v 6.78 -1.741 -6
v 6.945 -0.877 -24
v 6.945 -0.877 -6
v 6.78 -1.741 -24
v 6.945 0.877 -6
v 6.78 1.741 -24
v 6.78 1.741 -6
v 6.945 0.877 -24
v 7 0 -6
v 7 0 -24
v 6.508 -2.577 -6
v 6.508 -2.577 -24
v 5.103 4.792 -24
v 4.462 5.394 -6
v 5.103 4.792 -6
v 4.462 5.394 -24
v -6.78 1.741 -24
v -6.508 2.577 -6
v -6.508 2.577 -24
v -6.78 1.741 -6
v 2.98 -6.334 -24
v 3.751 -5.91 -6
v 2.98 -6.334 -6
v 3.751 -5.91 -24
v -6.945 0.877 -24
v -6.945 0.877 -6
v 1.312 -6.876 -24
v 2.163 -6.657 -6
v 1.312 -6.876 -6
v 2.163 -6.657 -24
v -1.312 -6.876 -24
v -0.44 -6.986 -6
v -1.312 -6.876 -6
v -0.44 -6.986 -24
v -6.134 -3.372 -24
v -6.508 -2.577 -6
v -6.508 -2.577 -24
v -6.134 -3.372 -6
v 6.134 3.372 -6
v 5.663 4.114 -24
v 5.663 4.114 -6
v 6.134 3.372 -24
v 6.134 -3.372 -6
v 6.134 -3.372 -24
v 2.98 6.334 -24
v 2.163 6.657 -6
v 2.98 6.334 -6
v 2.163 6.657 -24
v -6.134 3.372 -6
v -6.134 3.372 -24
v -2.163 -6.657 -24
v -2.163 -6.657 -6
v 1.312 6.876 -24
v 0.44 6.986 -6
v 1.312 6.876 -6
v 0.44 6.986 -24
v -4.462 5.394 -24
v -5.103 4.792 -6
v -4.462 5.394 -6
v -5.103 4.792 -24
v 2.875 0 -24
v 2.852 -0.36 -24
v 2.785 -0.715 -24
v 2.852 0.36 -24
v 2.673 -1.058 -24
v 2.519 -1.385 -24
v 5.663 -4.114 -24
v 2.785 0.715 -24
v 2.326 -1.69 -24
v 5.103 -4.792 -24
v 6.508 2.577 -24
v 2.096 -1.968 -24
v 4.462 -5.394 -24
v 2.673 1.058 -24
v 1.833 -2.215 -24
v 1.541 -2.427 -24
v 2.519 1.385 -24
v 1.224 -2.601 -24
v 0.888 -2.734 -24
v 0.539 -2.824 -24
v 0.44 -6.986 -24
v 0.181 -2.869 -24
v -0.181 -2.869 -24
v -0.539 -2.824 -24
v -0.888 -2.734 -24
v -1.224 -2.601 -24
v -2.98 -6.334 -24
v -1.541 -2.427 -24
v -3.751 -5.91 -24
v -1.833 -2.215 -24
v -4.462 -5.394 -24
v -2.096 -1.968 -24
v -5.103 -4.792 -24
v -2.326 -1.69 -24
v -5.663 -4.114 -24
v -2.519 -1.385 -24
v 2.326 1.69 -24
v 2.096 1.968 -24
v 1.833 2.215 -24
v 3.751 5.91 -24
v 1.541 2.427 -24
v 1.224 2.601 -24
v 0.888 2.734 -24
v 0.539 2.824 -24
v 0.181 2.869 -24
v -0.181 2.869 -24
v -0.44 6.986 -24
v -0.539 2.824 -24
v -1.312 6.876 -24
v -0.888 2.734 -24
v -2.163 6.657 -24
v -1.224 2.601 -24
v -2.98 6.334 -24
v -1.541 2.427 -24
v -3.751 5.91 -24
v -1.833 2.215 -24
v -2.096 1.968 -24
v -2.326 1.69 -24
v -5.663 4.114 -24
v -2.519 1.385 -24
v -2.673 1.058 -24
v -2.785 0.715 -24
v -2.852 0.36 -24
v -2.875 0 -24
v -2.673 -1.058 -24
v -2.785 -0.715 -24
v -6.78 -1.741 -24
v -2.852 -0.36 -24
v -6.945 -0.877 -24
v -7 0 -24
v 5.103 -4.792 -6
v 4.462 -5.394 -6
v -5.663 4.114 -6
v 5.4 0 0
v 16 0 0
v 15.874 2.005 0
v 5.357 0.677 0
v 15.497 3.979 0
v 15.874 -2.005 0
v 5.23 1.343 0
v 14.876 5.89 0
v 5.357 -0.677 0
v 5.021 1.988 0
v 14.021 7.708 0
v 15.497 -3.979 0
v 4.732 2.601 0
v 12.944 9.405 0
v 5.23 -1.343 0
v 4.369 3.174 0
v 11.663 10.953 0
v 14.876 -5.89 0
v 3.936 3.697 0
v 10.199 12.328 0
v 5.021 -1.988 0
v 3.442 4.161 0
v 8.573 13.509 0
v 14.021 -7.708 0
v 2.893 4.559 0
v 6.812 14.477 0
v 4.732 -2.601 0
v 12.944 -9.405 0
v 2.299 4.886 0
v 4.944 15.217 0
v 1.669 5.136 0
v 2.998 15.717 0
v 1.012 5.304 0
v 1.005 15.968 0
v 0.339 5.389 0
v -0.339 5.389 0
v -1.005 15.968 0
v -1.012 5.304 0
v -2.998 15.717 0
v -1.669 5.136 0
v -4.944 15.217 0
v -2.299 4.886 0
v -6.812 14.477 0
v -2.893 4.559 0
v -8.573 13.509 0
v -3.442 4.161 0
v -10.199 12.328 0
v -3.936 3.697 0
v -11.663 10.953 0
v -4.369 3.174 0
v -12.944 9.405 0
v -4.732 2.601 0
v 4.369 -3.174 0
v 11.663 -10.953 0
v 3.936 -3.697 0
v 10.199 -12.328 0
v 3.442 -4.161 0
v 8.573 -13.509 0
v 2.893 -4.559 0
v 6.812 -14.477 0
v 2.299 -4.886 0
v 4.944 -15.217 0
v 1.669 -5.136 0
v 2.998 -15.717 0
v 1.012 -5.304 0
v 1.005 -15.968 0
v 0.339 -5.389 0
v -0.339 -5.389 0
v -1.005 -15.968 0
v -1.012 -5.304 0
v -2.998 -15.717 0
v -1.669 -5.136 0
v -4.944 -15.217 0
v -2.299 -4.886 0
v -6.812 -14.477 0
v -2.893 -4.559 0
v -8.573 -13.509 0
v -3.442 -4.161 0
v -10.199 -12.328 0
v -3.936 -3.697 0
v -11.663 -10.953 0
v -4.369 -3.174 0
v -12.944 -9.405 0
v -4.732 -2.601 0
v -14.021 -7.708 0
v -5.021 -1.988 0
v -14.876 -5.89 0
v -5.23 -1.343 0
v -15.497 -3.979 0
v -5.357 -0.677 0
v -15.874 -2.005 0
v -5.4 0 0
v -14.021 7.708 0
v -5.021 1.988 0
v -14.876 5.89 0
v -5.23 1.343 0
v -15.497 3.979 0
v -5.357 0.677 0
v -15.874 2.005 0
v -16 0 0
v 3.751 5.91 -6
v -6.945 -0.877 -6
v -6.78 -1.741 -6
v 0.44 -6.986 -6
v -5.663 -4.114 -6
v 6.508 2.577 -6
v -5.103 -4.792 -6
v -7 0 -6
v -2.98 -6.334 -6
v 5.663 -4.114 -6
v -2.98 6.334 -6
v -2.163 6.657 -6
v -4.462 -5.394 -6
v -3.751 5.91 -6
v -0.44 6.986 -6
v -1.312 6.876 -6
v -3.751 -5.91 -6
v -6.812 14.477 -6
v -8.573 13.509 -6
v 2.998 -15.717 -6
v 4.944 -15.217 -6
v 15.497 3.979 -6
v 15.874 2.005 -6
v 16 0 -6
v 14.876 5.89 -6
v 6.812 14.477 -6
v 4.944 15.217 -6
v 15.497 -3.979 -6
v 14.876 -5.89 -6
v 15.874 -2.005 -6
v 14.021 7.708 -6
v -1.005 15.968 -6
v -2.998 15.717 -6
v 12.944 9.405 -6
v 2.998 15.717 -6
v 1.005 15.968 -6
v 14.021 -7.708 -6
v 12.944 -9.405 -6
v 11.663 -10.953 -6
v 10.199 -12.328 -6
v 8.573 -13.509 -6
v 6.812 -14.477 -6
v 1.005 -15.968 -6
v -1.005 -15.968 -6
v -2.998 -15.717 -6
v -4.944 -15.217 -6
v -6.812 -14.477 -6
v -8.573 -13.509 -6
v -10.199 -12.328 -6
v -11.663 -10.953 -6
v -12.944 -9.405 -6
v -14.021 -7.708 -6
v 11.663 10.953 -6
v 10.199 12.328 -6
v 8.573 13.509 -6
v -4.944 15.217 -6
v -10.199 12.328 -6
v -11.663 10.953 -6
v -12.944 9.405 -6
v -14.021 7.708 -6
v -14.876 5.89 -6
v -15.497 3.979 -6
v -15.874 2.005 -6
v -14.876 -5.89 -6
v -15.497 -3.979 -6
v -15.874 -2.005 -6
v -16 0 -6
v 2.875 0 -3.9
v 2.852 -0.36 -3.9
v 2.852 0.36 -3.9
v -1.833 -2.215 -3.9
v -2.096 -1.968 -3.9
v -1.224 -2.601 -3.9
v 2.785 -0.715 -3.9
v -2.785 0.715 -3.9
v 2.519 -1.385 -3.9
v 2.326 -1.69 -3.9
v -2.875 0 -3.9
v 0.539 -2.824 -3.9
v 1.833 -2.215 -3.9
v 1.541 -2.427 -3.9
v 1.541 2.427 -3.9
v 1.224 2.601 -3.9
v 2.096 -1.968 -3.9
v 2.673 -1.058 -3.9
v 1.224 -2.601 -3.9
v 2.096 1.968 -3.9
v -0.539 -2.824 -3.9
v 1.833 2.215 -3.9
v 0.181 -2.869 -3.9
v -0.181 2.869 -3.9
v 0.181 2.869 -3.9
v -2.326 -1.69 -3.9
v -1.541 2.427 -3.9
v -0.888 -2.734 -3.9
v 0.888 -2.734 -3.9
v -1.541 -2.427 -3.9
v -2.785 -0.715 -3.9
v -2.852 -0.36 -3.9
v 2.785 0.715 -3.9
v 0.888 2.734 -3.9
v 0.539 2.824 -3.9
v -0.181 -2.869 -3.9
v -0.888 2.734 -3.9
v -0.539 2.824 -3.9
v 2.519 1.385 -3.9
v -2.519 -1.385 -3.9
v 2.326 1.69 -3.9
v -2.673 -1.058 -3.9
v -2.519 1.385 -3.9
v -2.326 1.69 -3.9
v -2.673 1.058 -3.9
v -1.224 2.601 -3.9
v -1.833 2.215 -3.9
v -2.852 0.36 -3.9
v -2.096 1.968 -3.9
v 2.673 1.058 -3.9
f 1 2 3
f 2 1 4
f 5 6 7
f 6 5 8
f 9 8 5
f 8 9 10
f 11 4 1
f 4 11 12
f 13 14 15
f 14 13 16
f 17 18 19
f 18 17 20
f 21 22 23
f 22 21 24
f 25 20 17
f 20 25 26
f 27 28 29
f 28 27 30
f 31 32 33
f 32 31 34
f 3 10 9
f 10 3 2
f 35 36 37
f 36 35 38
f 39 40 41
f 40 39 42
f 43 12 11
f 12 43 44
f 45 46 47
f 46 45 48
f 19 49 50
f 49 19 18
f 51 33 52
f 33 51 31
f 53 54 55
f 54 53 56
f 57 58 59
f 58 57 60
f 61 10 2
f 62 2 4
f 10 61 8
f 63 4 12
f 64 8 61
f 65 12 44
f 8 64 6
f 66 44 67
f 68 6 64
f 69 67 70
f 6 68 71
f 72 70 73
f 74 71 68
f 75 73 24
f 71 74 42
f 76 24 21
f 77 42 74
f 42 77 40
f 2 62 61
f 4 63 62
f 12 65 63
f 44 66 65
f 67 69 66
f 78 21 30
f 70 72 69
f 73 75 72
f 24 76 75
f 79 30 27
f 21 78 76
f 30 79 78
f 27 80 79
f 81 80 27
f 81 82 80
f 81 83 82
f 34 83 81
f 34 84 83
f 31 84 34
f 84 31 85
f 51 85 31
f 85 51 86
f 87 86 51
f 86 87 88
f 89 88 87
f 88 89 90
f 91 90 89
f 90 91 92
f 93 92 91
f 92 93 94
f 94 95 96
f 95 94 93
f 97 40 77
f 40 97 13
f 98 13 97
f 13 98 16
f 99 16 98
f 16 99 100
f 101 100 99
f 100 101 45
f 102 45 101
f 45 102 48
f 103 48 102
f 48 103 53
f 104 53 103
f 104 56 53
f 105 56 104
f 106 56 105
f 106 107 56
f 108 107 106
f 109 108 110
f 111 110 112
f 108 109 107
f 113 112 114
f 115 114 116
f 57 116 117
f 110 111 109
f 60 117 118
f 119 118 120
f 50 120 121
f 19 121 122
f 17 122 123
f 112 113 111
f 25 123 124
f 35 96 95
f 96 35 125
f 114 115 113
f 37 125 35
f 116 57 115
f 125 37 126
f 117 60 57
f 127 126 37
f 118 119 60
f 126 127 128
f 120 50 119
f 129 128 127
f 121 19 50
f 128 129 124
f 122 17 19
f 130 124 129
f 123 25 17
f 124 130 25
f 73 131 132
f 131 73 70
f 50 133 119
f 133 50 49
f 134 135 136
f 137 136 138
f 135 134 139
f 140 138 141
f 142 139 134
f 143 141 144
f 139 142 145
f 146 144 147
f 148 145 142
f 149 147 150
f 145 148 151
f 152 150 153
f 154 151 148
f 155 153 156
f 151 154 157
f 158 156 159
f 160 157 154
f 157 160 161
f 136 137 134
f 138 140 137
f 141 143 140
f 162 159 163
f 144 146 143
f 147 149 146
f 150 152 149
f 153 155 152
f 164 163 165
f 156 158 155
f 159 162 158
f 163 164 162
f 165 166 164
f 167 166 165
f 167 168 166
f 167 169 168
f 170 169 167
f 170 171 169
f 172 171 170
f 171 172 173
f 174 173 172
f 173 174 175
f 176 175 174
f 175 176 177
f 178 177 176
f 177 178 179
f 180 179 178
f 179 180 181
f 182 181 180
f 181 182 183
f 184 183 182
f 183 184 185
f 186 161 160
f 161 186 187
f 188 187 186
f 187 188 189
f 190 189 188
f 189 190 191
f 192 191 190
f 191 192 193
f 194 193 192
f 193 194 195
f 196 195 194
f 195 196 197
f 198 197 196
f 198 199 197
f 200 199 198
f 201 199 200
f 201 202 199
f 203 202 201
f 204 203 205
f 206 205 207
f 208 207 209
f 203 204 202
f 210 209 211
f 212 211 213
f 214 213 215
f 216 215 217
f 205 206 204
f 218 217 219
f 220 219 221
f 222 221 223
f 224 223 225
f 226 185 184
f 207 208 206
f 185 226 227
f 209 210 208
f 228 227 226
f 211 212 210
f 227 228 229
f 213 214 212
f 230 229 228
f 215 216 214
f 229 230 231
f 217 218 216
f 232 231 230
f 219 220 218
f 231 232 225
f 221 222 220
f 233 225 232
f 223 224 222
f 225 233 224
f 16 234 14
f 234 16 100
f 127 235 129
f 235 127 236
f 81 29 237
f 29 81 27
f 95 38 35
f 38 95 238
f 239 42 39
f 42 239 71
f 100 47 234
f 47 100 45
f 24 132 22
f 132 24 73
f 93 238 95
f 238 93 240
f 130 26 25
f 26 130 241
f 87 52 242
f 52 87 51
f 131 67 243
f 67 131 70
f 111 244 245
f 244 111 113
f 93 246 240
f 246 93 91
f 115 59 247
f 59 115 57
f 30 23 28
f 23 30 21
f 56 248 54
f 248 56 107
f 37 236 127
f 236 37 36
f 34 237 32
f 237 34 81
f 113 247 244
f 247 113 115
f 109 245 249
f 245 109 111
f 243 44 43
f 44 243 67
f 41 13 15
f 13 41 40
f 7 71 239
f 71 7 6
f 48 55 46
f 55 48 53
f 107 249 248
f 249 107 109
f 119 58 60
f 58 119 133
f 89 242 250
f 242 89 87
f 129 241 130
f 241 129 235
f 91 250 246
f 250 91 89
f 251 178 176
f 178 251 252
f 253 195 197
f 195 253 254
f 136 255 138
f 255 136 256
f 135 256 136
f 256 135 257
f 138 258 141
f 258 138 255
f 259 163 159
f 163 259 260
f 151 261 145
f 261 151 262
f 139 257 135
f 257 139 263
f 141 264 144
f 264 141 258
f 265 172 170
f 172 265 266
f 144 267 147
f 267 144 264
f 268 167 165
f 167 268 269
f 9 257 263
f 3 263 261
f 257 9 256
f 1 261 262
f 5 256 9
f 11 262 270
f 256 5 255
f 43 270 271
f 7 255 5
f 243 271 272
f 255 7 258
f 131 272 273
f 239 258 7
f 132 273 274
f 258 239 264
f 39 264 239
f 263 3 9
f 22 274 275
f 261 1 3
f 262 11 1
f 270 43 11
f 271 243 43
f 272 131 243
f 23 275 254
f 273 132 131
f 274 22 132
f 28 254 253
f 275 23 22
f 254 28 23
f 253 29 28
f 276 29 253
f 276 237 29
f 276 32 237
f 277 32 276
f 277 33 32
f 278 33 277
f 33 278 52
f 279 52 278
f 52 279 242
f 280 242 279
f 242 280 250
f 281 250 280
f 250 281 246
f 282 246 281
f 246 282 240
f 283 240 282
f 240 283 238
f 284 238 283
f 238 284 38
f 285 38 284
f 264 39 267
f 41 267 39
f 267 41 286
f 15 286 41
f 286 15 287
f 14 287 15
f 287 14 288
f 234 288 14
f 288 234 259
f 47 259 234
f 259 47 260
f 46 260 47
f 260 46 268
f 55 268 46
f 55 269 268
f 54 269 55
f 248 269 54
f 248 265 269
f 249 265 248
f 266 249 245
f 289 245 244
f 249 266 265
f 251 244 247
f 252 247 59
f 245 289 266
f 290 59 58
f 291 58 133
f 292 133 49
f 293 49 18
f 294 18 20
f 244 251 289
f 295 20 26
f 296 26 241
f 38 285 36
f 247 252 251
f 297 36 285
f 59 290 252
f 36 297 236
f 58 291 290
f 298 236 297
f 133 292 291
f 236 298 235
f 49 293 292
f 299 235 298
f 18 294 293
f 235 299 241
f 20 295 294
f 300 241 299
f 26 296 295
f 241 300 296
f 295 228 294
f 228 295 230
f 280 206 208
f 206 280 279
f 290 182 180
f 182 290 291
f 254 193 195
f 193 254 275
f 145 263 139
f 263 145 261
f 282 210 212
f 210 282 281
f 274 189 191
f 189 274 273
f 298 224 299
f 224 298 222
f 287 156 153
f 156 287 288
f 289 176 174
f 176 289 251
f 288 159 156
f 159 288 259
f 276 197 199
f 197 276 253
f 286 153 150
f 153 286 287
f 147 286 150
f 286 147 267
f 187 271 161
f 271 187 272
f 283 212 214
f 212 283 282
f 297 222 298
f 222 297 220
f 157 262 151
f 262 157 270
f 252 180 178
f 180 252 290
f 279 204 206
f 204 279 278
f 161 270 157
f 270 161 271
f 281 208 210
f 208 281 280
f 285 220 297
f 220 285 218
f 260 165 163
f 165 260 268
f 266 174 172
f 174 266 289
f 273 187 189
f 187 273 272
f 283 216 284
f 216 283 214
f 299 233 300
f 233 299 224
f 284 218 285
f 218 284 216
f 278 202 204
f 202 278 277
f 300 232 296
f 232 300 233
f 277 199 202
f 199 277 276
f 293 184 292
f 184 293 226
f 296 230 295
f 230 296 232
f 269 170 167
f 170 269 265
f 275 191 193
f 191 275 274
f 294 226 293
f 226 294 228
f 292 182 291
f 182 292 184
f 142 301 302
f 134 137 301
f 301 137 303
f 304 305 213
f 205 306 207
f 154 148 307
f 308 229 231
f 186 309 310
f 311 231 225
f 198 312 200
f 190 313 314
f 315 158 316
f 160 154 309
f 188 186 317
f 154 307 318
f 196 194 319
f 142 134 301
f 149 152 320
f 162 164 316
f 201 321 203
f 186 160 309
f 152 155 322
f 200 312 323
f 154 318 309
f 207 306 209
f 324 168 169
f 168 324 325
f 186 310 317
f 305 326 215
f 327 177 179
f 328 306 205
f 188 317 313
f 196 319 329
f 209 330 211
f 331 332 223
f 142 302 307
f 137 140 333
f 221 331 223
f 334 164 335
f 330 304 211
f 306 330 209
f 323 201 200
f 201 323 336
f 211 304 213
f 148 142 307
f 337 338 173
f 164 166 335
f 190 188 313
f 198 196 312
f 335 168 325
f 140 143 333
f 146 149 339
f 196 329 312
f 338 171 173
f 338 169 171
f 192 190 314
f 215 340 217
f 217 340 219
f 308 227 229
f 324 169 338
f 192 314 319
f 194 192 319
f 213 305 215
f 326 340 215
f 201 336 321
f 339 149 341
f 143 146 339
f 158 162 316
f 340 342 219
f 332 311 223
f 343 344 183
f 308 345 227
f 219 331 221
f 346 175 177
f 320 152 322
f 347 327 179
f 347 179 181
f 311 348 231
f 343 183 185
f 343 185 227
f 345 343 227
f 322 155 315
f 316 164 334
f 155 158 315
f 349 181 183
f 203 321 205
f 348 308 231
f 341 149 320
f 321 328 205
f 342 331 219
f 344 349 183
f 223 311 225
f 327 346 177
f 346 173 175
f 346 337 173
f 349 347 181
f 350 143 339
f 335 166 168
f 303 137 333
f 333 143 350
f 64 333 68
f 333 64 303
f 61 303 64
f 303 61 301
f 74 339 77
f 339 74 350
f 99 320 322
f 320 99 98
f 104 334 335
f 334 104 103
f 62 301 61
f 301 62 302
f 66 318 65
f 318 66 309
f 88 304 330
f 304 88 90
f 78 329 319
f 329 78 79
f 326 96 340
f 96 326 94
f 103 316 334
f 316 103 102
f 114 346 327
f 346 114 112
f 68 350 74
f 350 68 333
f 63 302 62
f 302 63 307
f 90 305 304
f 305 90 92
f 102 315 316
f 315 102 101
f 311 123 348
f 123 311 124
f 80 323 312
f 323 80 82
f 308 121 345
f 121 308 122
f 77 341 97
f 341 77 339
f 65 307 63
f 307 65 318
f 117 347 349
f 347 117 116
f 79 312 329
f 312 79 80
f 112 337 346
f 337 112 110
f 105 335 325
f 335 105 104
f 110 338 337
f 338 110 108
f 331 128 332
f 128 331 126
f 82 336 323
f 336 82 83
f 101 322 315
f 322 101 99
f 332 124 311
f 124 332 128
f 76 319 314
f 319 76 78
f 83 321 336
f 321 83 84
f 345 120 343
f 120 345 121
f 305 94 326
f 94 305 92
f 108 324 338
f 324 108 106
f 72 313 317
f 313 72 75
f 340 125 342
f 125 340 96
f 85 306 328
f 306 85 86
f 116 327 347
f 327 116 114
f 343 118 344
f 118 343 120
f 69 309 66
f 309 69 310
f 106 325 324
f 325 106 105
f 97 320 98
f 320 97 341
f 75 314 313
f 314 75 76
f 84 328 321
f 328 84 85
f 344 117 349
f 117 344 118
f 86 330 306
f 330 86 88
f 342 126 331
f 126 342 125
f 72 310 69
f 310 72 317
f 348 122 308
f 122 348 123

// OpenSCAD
$fn = 50;


difference() {
	union() {
		translate(v = [0, 0, -24.0000000000]) {
			cylinder(h = 24, r = 7.0000000000);
		}
		translate(v = [0, 0, -6.0000000000]) {
			cylinder(h = 6, r = 16.0000000000);
		}
	}
	union() {
		translate(v = [0, 0, 0]) {
			rotate(a = [0, 0, 0]) {
				difference() {
					union() {
						#translate(v = [0, 0, -24.0000000000]) {
							cylinder(h = 24, r = 2.6000000000);
						}
						#translate(v = [0, 0, -3.9000000000]) {
							cylinder(h = 3.9000000000, r1 = 2.8750000000, r2 = 5.4000000000);
						}
						#translate(v = [0, 0, -24.0000000000]) {
							cylinder(h = 24, r = 2.8750000000);
						}
						#translate(v = [0, 0, -24.0000000000]) {
							cylinder(h = 24, r = 2.6000000000);
						}
					}
					union();
				}
			}
		}
	}
}
